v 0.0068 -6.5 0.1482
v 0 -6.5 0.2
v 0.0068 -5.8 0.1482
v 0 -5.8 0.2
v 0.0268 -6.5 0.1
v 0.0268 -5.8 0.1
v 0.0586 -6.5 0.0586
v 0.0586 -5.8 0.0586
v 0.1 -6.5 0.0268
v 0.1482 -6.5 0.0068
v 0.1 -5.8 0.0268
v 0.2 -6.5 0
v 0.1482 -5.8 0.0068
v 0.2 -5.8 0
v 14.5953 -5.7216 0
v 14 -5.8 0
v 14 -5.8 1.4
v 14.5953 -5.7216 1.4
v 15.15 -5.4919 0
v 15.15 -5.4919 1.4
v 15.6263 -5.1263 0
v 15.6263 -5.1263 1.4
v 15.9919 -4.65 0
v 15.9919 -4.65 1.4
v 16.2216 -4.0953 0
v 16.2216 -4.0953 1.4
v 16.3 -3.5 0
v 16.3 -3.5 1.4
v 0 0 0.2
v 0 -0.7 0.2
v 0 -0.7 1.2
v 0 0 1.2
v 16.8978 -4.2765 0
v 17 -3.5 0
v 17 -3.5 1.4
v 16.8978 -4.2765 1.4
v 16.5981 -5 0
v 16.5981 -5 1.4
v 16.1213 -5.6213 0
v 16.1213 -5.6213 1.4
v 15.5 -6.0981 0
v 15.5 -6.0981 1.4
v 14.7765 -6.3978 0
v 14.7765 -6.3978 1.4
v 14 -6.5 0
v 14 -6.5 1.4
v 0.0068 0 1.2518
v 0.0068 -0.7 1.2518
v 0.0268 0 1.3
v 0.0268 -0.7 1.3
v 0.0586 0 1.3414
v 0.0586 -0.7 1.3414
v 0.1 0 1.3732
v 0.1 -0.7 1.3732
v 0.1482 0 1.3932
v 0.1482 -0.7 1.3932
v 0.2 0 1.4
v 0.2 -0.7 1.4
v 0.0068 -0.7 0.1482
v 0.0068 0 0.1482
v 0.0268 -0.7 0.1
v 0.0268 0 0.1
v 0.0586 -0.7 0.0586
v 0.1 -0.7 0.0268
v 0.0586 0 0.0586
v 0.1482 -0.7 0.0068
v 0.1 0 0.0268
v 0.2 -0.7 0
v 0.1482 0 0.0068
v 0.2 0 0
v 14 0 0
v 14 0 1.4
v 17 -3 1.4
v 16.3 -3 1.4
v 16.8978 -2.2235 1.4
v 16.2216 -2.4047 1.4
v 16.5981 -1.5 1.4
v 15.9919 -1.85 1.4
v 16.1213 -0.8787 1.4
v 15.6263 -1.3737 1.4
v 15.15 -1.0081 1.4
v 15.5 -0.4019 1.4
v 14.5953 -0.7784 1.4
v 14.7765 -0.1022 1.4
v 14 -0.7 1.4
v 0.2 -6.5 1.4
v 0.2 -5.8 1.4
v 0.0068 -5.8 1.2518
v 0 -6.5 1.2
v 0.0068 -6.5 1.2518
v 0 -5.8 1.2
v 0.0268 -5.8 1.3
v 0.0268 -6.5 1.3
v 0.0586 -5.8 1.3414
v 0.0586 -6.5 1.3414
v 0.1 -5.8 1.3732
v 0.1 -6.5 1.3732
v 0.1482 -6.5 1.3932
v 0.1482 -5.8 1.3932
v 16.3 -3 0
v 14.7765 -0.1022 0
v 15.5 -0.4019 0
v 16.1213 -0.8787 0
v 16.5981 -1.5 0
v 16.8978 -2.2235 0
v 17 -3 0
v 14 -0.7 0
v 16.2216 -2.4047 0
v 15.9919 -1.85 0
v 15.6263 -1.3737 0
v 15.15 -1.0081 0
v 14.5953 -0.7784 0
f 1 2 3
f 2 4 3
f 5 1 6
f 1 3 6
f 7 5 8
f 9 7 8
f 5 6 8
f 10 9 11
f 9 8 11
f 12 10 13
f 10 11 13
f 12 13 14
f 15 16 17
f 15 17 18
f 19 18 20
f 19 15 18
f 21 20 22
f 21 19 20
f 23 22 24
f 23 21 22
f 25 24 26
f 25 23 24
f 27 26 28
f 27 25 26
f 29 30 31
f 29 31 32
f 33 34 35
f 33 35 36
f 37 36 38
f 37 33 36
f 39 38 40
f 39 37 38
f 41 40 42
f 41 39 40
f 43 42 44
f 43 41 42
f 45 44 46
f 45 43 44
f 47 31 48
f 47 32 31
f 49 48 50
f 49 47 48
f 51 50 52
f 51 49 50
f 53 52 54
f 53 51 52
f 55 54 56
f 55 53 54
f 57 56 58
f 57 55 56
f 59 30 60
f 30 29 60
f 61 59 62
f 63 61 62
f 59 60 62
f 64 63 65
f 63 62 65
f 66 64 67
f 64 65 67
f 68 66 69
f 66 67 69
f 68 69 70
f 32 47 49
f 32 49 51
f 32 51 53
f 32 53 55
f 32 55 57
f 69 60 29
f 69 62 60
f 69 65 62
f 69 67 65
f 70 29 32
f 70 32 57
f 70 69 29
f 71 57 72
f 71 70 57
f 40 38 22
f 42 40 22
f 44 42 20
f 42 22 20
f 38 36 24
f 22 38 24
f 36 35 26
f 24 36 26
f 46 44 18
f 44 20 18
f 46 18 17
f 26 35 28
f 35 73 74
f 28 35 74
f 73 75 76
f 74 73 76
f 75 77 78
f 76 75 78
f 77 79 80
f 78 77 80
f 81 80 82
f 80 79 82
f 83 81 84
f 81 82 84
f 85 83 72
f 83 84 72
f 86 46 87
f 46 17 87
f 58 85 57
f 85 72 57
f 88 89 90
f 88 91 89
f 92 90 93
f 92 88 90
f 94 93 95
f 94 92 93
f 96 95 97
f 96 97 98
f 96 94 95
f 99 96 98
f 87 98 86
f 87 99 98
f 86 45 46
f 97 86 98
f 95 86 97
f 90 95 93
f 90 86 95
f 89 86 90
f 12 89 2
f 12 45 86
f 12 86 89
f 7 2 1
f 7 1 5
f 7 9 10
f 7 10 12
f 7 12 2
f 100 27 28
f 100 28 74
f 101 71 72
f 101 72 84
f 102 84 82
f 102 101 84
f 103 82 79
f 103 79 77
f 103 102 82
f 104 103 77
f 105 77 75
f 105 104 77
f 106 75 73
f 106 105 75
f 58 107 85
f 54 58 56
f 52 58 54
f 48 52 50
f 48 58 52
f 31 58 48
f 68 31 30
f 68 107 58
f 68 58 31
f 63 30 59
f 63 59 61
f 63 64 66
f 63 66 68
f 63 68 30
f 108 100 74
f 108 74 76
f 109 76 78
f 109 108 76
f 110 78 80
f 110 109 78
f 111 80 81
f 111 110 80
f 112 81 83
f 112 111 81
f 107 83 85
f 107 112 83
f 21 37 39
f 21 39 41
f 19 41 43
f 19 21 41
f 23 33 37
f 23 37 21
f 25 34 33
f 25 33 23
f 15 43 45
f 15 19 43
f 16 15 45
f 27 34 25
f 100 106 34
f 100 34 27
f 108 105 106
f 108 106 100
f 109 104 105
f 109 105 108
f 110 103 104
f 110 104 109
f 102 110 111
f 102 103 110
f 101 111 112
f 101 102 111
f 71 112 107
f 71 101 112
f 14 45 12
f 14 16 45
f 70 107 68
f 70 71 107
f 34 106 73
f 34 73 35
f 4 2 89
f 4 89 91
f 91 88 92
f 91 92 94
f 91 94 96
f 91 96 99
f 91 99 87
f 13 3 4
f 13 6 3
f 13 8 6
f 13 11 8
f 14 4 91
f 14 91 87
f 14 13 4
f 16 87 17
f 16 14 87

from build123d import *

# Parameters (mm, degrees)
SM_BASE_FLANGE_1_DEPTH = 1.4
FILLET_1_R             = 0.2


# Sheet-metal steps are written as plain solids
with BuildPart() as part:
    # Sketch 1 → Базовая кромка1 (new body)
    with BuildSketch(Plane.XY):
        with BuildLine():
            Line((0, 0), (14, 0))
            ThreePointArc((14, 0), (16.121320344, -0.878679656), (17, -3))
            Line((17, -3), (17, -3.5))
            ThreePointArc((17, -3.5), (16.121320344, -5.621320344), (14, -6.5))
            Line((14, -6.5), (0, -6.5))
            Line((0, -6.5), (0, -5.8))
            Line((0, -5.8), (14, -5.8))
            ThreePointArc((14, -5.8), (15.626345597, -5.126345597), (16.3, -3.5))
            Line((16.3, -3.5), (16.3, -3))
            ThreePointArc((16.3, -3), (15.626345597, -1.373654403), (14, -0.7))
            Line((14, -0.7), (0, -0.7))
            Line((0, -0.7), (0, 0))
        make_face()
    extrude(amount=SM_BASE_FLANGE_1_DEPTH)

    # Скругление1
    fillet_1_edges = [part.edges().sort_by_distance(p)[0] for p in [
        (0, -0.35, 0),
        (0, -6.15, 0),
        (0, -0.35, 1.4),
        (0, -6.15, 1.4),
    ]]
    fillet(fillet_1_edges, radius=FILLET_1_R)


solid = part.part
